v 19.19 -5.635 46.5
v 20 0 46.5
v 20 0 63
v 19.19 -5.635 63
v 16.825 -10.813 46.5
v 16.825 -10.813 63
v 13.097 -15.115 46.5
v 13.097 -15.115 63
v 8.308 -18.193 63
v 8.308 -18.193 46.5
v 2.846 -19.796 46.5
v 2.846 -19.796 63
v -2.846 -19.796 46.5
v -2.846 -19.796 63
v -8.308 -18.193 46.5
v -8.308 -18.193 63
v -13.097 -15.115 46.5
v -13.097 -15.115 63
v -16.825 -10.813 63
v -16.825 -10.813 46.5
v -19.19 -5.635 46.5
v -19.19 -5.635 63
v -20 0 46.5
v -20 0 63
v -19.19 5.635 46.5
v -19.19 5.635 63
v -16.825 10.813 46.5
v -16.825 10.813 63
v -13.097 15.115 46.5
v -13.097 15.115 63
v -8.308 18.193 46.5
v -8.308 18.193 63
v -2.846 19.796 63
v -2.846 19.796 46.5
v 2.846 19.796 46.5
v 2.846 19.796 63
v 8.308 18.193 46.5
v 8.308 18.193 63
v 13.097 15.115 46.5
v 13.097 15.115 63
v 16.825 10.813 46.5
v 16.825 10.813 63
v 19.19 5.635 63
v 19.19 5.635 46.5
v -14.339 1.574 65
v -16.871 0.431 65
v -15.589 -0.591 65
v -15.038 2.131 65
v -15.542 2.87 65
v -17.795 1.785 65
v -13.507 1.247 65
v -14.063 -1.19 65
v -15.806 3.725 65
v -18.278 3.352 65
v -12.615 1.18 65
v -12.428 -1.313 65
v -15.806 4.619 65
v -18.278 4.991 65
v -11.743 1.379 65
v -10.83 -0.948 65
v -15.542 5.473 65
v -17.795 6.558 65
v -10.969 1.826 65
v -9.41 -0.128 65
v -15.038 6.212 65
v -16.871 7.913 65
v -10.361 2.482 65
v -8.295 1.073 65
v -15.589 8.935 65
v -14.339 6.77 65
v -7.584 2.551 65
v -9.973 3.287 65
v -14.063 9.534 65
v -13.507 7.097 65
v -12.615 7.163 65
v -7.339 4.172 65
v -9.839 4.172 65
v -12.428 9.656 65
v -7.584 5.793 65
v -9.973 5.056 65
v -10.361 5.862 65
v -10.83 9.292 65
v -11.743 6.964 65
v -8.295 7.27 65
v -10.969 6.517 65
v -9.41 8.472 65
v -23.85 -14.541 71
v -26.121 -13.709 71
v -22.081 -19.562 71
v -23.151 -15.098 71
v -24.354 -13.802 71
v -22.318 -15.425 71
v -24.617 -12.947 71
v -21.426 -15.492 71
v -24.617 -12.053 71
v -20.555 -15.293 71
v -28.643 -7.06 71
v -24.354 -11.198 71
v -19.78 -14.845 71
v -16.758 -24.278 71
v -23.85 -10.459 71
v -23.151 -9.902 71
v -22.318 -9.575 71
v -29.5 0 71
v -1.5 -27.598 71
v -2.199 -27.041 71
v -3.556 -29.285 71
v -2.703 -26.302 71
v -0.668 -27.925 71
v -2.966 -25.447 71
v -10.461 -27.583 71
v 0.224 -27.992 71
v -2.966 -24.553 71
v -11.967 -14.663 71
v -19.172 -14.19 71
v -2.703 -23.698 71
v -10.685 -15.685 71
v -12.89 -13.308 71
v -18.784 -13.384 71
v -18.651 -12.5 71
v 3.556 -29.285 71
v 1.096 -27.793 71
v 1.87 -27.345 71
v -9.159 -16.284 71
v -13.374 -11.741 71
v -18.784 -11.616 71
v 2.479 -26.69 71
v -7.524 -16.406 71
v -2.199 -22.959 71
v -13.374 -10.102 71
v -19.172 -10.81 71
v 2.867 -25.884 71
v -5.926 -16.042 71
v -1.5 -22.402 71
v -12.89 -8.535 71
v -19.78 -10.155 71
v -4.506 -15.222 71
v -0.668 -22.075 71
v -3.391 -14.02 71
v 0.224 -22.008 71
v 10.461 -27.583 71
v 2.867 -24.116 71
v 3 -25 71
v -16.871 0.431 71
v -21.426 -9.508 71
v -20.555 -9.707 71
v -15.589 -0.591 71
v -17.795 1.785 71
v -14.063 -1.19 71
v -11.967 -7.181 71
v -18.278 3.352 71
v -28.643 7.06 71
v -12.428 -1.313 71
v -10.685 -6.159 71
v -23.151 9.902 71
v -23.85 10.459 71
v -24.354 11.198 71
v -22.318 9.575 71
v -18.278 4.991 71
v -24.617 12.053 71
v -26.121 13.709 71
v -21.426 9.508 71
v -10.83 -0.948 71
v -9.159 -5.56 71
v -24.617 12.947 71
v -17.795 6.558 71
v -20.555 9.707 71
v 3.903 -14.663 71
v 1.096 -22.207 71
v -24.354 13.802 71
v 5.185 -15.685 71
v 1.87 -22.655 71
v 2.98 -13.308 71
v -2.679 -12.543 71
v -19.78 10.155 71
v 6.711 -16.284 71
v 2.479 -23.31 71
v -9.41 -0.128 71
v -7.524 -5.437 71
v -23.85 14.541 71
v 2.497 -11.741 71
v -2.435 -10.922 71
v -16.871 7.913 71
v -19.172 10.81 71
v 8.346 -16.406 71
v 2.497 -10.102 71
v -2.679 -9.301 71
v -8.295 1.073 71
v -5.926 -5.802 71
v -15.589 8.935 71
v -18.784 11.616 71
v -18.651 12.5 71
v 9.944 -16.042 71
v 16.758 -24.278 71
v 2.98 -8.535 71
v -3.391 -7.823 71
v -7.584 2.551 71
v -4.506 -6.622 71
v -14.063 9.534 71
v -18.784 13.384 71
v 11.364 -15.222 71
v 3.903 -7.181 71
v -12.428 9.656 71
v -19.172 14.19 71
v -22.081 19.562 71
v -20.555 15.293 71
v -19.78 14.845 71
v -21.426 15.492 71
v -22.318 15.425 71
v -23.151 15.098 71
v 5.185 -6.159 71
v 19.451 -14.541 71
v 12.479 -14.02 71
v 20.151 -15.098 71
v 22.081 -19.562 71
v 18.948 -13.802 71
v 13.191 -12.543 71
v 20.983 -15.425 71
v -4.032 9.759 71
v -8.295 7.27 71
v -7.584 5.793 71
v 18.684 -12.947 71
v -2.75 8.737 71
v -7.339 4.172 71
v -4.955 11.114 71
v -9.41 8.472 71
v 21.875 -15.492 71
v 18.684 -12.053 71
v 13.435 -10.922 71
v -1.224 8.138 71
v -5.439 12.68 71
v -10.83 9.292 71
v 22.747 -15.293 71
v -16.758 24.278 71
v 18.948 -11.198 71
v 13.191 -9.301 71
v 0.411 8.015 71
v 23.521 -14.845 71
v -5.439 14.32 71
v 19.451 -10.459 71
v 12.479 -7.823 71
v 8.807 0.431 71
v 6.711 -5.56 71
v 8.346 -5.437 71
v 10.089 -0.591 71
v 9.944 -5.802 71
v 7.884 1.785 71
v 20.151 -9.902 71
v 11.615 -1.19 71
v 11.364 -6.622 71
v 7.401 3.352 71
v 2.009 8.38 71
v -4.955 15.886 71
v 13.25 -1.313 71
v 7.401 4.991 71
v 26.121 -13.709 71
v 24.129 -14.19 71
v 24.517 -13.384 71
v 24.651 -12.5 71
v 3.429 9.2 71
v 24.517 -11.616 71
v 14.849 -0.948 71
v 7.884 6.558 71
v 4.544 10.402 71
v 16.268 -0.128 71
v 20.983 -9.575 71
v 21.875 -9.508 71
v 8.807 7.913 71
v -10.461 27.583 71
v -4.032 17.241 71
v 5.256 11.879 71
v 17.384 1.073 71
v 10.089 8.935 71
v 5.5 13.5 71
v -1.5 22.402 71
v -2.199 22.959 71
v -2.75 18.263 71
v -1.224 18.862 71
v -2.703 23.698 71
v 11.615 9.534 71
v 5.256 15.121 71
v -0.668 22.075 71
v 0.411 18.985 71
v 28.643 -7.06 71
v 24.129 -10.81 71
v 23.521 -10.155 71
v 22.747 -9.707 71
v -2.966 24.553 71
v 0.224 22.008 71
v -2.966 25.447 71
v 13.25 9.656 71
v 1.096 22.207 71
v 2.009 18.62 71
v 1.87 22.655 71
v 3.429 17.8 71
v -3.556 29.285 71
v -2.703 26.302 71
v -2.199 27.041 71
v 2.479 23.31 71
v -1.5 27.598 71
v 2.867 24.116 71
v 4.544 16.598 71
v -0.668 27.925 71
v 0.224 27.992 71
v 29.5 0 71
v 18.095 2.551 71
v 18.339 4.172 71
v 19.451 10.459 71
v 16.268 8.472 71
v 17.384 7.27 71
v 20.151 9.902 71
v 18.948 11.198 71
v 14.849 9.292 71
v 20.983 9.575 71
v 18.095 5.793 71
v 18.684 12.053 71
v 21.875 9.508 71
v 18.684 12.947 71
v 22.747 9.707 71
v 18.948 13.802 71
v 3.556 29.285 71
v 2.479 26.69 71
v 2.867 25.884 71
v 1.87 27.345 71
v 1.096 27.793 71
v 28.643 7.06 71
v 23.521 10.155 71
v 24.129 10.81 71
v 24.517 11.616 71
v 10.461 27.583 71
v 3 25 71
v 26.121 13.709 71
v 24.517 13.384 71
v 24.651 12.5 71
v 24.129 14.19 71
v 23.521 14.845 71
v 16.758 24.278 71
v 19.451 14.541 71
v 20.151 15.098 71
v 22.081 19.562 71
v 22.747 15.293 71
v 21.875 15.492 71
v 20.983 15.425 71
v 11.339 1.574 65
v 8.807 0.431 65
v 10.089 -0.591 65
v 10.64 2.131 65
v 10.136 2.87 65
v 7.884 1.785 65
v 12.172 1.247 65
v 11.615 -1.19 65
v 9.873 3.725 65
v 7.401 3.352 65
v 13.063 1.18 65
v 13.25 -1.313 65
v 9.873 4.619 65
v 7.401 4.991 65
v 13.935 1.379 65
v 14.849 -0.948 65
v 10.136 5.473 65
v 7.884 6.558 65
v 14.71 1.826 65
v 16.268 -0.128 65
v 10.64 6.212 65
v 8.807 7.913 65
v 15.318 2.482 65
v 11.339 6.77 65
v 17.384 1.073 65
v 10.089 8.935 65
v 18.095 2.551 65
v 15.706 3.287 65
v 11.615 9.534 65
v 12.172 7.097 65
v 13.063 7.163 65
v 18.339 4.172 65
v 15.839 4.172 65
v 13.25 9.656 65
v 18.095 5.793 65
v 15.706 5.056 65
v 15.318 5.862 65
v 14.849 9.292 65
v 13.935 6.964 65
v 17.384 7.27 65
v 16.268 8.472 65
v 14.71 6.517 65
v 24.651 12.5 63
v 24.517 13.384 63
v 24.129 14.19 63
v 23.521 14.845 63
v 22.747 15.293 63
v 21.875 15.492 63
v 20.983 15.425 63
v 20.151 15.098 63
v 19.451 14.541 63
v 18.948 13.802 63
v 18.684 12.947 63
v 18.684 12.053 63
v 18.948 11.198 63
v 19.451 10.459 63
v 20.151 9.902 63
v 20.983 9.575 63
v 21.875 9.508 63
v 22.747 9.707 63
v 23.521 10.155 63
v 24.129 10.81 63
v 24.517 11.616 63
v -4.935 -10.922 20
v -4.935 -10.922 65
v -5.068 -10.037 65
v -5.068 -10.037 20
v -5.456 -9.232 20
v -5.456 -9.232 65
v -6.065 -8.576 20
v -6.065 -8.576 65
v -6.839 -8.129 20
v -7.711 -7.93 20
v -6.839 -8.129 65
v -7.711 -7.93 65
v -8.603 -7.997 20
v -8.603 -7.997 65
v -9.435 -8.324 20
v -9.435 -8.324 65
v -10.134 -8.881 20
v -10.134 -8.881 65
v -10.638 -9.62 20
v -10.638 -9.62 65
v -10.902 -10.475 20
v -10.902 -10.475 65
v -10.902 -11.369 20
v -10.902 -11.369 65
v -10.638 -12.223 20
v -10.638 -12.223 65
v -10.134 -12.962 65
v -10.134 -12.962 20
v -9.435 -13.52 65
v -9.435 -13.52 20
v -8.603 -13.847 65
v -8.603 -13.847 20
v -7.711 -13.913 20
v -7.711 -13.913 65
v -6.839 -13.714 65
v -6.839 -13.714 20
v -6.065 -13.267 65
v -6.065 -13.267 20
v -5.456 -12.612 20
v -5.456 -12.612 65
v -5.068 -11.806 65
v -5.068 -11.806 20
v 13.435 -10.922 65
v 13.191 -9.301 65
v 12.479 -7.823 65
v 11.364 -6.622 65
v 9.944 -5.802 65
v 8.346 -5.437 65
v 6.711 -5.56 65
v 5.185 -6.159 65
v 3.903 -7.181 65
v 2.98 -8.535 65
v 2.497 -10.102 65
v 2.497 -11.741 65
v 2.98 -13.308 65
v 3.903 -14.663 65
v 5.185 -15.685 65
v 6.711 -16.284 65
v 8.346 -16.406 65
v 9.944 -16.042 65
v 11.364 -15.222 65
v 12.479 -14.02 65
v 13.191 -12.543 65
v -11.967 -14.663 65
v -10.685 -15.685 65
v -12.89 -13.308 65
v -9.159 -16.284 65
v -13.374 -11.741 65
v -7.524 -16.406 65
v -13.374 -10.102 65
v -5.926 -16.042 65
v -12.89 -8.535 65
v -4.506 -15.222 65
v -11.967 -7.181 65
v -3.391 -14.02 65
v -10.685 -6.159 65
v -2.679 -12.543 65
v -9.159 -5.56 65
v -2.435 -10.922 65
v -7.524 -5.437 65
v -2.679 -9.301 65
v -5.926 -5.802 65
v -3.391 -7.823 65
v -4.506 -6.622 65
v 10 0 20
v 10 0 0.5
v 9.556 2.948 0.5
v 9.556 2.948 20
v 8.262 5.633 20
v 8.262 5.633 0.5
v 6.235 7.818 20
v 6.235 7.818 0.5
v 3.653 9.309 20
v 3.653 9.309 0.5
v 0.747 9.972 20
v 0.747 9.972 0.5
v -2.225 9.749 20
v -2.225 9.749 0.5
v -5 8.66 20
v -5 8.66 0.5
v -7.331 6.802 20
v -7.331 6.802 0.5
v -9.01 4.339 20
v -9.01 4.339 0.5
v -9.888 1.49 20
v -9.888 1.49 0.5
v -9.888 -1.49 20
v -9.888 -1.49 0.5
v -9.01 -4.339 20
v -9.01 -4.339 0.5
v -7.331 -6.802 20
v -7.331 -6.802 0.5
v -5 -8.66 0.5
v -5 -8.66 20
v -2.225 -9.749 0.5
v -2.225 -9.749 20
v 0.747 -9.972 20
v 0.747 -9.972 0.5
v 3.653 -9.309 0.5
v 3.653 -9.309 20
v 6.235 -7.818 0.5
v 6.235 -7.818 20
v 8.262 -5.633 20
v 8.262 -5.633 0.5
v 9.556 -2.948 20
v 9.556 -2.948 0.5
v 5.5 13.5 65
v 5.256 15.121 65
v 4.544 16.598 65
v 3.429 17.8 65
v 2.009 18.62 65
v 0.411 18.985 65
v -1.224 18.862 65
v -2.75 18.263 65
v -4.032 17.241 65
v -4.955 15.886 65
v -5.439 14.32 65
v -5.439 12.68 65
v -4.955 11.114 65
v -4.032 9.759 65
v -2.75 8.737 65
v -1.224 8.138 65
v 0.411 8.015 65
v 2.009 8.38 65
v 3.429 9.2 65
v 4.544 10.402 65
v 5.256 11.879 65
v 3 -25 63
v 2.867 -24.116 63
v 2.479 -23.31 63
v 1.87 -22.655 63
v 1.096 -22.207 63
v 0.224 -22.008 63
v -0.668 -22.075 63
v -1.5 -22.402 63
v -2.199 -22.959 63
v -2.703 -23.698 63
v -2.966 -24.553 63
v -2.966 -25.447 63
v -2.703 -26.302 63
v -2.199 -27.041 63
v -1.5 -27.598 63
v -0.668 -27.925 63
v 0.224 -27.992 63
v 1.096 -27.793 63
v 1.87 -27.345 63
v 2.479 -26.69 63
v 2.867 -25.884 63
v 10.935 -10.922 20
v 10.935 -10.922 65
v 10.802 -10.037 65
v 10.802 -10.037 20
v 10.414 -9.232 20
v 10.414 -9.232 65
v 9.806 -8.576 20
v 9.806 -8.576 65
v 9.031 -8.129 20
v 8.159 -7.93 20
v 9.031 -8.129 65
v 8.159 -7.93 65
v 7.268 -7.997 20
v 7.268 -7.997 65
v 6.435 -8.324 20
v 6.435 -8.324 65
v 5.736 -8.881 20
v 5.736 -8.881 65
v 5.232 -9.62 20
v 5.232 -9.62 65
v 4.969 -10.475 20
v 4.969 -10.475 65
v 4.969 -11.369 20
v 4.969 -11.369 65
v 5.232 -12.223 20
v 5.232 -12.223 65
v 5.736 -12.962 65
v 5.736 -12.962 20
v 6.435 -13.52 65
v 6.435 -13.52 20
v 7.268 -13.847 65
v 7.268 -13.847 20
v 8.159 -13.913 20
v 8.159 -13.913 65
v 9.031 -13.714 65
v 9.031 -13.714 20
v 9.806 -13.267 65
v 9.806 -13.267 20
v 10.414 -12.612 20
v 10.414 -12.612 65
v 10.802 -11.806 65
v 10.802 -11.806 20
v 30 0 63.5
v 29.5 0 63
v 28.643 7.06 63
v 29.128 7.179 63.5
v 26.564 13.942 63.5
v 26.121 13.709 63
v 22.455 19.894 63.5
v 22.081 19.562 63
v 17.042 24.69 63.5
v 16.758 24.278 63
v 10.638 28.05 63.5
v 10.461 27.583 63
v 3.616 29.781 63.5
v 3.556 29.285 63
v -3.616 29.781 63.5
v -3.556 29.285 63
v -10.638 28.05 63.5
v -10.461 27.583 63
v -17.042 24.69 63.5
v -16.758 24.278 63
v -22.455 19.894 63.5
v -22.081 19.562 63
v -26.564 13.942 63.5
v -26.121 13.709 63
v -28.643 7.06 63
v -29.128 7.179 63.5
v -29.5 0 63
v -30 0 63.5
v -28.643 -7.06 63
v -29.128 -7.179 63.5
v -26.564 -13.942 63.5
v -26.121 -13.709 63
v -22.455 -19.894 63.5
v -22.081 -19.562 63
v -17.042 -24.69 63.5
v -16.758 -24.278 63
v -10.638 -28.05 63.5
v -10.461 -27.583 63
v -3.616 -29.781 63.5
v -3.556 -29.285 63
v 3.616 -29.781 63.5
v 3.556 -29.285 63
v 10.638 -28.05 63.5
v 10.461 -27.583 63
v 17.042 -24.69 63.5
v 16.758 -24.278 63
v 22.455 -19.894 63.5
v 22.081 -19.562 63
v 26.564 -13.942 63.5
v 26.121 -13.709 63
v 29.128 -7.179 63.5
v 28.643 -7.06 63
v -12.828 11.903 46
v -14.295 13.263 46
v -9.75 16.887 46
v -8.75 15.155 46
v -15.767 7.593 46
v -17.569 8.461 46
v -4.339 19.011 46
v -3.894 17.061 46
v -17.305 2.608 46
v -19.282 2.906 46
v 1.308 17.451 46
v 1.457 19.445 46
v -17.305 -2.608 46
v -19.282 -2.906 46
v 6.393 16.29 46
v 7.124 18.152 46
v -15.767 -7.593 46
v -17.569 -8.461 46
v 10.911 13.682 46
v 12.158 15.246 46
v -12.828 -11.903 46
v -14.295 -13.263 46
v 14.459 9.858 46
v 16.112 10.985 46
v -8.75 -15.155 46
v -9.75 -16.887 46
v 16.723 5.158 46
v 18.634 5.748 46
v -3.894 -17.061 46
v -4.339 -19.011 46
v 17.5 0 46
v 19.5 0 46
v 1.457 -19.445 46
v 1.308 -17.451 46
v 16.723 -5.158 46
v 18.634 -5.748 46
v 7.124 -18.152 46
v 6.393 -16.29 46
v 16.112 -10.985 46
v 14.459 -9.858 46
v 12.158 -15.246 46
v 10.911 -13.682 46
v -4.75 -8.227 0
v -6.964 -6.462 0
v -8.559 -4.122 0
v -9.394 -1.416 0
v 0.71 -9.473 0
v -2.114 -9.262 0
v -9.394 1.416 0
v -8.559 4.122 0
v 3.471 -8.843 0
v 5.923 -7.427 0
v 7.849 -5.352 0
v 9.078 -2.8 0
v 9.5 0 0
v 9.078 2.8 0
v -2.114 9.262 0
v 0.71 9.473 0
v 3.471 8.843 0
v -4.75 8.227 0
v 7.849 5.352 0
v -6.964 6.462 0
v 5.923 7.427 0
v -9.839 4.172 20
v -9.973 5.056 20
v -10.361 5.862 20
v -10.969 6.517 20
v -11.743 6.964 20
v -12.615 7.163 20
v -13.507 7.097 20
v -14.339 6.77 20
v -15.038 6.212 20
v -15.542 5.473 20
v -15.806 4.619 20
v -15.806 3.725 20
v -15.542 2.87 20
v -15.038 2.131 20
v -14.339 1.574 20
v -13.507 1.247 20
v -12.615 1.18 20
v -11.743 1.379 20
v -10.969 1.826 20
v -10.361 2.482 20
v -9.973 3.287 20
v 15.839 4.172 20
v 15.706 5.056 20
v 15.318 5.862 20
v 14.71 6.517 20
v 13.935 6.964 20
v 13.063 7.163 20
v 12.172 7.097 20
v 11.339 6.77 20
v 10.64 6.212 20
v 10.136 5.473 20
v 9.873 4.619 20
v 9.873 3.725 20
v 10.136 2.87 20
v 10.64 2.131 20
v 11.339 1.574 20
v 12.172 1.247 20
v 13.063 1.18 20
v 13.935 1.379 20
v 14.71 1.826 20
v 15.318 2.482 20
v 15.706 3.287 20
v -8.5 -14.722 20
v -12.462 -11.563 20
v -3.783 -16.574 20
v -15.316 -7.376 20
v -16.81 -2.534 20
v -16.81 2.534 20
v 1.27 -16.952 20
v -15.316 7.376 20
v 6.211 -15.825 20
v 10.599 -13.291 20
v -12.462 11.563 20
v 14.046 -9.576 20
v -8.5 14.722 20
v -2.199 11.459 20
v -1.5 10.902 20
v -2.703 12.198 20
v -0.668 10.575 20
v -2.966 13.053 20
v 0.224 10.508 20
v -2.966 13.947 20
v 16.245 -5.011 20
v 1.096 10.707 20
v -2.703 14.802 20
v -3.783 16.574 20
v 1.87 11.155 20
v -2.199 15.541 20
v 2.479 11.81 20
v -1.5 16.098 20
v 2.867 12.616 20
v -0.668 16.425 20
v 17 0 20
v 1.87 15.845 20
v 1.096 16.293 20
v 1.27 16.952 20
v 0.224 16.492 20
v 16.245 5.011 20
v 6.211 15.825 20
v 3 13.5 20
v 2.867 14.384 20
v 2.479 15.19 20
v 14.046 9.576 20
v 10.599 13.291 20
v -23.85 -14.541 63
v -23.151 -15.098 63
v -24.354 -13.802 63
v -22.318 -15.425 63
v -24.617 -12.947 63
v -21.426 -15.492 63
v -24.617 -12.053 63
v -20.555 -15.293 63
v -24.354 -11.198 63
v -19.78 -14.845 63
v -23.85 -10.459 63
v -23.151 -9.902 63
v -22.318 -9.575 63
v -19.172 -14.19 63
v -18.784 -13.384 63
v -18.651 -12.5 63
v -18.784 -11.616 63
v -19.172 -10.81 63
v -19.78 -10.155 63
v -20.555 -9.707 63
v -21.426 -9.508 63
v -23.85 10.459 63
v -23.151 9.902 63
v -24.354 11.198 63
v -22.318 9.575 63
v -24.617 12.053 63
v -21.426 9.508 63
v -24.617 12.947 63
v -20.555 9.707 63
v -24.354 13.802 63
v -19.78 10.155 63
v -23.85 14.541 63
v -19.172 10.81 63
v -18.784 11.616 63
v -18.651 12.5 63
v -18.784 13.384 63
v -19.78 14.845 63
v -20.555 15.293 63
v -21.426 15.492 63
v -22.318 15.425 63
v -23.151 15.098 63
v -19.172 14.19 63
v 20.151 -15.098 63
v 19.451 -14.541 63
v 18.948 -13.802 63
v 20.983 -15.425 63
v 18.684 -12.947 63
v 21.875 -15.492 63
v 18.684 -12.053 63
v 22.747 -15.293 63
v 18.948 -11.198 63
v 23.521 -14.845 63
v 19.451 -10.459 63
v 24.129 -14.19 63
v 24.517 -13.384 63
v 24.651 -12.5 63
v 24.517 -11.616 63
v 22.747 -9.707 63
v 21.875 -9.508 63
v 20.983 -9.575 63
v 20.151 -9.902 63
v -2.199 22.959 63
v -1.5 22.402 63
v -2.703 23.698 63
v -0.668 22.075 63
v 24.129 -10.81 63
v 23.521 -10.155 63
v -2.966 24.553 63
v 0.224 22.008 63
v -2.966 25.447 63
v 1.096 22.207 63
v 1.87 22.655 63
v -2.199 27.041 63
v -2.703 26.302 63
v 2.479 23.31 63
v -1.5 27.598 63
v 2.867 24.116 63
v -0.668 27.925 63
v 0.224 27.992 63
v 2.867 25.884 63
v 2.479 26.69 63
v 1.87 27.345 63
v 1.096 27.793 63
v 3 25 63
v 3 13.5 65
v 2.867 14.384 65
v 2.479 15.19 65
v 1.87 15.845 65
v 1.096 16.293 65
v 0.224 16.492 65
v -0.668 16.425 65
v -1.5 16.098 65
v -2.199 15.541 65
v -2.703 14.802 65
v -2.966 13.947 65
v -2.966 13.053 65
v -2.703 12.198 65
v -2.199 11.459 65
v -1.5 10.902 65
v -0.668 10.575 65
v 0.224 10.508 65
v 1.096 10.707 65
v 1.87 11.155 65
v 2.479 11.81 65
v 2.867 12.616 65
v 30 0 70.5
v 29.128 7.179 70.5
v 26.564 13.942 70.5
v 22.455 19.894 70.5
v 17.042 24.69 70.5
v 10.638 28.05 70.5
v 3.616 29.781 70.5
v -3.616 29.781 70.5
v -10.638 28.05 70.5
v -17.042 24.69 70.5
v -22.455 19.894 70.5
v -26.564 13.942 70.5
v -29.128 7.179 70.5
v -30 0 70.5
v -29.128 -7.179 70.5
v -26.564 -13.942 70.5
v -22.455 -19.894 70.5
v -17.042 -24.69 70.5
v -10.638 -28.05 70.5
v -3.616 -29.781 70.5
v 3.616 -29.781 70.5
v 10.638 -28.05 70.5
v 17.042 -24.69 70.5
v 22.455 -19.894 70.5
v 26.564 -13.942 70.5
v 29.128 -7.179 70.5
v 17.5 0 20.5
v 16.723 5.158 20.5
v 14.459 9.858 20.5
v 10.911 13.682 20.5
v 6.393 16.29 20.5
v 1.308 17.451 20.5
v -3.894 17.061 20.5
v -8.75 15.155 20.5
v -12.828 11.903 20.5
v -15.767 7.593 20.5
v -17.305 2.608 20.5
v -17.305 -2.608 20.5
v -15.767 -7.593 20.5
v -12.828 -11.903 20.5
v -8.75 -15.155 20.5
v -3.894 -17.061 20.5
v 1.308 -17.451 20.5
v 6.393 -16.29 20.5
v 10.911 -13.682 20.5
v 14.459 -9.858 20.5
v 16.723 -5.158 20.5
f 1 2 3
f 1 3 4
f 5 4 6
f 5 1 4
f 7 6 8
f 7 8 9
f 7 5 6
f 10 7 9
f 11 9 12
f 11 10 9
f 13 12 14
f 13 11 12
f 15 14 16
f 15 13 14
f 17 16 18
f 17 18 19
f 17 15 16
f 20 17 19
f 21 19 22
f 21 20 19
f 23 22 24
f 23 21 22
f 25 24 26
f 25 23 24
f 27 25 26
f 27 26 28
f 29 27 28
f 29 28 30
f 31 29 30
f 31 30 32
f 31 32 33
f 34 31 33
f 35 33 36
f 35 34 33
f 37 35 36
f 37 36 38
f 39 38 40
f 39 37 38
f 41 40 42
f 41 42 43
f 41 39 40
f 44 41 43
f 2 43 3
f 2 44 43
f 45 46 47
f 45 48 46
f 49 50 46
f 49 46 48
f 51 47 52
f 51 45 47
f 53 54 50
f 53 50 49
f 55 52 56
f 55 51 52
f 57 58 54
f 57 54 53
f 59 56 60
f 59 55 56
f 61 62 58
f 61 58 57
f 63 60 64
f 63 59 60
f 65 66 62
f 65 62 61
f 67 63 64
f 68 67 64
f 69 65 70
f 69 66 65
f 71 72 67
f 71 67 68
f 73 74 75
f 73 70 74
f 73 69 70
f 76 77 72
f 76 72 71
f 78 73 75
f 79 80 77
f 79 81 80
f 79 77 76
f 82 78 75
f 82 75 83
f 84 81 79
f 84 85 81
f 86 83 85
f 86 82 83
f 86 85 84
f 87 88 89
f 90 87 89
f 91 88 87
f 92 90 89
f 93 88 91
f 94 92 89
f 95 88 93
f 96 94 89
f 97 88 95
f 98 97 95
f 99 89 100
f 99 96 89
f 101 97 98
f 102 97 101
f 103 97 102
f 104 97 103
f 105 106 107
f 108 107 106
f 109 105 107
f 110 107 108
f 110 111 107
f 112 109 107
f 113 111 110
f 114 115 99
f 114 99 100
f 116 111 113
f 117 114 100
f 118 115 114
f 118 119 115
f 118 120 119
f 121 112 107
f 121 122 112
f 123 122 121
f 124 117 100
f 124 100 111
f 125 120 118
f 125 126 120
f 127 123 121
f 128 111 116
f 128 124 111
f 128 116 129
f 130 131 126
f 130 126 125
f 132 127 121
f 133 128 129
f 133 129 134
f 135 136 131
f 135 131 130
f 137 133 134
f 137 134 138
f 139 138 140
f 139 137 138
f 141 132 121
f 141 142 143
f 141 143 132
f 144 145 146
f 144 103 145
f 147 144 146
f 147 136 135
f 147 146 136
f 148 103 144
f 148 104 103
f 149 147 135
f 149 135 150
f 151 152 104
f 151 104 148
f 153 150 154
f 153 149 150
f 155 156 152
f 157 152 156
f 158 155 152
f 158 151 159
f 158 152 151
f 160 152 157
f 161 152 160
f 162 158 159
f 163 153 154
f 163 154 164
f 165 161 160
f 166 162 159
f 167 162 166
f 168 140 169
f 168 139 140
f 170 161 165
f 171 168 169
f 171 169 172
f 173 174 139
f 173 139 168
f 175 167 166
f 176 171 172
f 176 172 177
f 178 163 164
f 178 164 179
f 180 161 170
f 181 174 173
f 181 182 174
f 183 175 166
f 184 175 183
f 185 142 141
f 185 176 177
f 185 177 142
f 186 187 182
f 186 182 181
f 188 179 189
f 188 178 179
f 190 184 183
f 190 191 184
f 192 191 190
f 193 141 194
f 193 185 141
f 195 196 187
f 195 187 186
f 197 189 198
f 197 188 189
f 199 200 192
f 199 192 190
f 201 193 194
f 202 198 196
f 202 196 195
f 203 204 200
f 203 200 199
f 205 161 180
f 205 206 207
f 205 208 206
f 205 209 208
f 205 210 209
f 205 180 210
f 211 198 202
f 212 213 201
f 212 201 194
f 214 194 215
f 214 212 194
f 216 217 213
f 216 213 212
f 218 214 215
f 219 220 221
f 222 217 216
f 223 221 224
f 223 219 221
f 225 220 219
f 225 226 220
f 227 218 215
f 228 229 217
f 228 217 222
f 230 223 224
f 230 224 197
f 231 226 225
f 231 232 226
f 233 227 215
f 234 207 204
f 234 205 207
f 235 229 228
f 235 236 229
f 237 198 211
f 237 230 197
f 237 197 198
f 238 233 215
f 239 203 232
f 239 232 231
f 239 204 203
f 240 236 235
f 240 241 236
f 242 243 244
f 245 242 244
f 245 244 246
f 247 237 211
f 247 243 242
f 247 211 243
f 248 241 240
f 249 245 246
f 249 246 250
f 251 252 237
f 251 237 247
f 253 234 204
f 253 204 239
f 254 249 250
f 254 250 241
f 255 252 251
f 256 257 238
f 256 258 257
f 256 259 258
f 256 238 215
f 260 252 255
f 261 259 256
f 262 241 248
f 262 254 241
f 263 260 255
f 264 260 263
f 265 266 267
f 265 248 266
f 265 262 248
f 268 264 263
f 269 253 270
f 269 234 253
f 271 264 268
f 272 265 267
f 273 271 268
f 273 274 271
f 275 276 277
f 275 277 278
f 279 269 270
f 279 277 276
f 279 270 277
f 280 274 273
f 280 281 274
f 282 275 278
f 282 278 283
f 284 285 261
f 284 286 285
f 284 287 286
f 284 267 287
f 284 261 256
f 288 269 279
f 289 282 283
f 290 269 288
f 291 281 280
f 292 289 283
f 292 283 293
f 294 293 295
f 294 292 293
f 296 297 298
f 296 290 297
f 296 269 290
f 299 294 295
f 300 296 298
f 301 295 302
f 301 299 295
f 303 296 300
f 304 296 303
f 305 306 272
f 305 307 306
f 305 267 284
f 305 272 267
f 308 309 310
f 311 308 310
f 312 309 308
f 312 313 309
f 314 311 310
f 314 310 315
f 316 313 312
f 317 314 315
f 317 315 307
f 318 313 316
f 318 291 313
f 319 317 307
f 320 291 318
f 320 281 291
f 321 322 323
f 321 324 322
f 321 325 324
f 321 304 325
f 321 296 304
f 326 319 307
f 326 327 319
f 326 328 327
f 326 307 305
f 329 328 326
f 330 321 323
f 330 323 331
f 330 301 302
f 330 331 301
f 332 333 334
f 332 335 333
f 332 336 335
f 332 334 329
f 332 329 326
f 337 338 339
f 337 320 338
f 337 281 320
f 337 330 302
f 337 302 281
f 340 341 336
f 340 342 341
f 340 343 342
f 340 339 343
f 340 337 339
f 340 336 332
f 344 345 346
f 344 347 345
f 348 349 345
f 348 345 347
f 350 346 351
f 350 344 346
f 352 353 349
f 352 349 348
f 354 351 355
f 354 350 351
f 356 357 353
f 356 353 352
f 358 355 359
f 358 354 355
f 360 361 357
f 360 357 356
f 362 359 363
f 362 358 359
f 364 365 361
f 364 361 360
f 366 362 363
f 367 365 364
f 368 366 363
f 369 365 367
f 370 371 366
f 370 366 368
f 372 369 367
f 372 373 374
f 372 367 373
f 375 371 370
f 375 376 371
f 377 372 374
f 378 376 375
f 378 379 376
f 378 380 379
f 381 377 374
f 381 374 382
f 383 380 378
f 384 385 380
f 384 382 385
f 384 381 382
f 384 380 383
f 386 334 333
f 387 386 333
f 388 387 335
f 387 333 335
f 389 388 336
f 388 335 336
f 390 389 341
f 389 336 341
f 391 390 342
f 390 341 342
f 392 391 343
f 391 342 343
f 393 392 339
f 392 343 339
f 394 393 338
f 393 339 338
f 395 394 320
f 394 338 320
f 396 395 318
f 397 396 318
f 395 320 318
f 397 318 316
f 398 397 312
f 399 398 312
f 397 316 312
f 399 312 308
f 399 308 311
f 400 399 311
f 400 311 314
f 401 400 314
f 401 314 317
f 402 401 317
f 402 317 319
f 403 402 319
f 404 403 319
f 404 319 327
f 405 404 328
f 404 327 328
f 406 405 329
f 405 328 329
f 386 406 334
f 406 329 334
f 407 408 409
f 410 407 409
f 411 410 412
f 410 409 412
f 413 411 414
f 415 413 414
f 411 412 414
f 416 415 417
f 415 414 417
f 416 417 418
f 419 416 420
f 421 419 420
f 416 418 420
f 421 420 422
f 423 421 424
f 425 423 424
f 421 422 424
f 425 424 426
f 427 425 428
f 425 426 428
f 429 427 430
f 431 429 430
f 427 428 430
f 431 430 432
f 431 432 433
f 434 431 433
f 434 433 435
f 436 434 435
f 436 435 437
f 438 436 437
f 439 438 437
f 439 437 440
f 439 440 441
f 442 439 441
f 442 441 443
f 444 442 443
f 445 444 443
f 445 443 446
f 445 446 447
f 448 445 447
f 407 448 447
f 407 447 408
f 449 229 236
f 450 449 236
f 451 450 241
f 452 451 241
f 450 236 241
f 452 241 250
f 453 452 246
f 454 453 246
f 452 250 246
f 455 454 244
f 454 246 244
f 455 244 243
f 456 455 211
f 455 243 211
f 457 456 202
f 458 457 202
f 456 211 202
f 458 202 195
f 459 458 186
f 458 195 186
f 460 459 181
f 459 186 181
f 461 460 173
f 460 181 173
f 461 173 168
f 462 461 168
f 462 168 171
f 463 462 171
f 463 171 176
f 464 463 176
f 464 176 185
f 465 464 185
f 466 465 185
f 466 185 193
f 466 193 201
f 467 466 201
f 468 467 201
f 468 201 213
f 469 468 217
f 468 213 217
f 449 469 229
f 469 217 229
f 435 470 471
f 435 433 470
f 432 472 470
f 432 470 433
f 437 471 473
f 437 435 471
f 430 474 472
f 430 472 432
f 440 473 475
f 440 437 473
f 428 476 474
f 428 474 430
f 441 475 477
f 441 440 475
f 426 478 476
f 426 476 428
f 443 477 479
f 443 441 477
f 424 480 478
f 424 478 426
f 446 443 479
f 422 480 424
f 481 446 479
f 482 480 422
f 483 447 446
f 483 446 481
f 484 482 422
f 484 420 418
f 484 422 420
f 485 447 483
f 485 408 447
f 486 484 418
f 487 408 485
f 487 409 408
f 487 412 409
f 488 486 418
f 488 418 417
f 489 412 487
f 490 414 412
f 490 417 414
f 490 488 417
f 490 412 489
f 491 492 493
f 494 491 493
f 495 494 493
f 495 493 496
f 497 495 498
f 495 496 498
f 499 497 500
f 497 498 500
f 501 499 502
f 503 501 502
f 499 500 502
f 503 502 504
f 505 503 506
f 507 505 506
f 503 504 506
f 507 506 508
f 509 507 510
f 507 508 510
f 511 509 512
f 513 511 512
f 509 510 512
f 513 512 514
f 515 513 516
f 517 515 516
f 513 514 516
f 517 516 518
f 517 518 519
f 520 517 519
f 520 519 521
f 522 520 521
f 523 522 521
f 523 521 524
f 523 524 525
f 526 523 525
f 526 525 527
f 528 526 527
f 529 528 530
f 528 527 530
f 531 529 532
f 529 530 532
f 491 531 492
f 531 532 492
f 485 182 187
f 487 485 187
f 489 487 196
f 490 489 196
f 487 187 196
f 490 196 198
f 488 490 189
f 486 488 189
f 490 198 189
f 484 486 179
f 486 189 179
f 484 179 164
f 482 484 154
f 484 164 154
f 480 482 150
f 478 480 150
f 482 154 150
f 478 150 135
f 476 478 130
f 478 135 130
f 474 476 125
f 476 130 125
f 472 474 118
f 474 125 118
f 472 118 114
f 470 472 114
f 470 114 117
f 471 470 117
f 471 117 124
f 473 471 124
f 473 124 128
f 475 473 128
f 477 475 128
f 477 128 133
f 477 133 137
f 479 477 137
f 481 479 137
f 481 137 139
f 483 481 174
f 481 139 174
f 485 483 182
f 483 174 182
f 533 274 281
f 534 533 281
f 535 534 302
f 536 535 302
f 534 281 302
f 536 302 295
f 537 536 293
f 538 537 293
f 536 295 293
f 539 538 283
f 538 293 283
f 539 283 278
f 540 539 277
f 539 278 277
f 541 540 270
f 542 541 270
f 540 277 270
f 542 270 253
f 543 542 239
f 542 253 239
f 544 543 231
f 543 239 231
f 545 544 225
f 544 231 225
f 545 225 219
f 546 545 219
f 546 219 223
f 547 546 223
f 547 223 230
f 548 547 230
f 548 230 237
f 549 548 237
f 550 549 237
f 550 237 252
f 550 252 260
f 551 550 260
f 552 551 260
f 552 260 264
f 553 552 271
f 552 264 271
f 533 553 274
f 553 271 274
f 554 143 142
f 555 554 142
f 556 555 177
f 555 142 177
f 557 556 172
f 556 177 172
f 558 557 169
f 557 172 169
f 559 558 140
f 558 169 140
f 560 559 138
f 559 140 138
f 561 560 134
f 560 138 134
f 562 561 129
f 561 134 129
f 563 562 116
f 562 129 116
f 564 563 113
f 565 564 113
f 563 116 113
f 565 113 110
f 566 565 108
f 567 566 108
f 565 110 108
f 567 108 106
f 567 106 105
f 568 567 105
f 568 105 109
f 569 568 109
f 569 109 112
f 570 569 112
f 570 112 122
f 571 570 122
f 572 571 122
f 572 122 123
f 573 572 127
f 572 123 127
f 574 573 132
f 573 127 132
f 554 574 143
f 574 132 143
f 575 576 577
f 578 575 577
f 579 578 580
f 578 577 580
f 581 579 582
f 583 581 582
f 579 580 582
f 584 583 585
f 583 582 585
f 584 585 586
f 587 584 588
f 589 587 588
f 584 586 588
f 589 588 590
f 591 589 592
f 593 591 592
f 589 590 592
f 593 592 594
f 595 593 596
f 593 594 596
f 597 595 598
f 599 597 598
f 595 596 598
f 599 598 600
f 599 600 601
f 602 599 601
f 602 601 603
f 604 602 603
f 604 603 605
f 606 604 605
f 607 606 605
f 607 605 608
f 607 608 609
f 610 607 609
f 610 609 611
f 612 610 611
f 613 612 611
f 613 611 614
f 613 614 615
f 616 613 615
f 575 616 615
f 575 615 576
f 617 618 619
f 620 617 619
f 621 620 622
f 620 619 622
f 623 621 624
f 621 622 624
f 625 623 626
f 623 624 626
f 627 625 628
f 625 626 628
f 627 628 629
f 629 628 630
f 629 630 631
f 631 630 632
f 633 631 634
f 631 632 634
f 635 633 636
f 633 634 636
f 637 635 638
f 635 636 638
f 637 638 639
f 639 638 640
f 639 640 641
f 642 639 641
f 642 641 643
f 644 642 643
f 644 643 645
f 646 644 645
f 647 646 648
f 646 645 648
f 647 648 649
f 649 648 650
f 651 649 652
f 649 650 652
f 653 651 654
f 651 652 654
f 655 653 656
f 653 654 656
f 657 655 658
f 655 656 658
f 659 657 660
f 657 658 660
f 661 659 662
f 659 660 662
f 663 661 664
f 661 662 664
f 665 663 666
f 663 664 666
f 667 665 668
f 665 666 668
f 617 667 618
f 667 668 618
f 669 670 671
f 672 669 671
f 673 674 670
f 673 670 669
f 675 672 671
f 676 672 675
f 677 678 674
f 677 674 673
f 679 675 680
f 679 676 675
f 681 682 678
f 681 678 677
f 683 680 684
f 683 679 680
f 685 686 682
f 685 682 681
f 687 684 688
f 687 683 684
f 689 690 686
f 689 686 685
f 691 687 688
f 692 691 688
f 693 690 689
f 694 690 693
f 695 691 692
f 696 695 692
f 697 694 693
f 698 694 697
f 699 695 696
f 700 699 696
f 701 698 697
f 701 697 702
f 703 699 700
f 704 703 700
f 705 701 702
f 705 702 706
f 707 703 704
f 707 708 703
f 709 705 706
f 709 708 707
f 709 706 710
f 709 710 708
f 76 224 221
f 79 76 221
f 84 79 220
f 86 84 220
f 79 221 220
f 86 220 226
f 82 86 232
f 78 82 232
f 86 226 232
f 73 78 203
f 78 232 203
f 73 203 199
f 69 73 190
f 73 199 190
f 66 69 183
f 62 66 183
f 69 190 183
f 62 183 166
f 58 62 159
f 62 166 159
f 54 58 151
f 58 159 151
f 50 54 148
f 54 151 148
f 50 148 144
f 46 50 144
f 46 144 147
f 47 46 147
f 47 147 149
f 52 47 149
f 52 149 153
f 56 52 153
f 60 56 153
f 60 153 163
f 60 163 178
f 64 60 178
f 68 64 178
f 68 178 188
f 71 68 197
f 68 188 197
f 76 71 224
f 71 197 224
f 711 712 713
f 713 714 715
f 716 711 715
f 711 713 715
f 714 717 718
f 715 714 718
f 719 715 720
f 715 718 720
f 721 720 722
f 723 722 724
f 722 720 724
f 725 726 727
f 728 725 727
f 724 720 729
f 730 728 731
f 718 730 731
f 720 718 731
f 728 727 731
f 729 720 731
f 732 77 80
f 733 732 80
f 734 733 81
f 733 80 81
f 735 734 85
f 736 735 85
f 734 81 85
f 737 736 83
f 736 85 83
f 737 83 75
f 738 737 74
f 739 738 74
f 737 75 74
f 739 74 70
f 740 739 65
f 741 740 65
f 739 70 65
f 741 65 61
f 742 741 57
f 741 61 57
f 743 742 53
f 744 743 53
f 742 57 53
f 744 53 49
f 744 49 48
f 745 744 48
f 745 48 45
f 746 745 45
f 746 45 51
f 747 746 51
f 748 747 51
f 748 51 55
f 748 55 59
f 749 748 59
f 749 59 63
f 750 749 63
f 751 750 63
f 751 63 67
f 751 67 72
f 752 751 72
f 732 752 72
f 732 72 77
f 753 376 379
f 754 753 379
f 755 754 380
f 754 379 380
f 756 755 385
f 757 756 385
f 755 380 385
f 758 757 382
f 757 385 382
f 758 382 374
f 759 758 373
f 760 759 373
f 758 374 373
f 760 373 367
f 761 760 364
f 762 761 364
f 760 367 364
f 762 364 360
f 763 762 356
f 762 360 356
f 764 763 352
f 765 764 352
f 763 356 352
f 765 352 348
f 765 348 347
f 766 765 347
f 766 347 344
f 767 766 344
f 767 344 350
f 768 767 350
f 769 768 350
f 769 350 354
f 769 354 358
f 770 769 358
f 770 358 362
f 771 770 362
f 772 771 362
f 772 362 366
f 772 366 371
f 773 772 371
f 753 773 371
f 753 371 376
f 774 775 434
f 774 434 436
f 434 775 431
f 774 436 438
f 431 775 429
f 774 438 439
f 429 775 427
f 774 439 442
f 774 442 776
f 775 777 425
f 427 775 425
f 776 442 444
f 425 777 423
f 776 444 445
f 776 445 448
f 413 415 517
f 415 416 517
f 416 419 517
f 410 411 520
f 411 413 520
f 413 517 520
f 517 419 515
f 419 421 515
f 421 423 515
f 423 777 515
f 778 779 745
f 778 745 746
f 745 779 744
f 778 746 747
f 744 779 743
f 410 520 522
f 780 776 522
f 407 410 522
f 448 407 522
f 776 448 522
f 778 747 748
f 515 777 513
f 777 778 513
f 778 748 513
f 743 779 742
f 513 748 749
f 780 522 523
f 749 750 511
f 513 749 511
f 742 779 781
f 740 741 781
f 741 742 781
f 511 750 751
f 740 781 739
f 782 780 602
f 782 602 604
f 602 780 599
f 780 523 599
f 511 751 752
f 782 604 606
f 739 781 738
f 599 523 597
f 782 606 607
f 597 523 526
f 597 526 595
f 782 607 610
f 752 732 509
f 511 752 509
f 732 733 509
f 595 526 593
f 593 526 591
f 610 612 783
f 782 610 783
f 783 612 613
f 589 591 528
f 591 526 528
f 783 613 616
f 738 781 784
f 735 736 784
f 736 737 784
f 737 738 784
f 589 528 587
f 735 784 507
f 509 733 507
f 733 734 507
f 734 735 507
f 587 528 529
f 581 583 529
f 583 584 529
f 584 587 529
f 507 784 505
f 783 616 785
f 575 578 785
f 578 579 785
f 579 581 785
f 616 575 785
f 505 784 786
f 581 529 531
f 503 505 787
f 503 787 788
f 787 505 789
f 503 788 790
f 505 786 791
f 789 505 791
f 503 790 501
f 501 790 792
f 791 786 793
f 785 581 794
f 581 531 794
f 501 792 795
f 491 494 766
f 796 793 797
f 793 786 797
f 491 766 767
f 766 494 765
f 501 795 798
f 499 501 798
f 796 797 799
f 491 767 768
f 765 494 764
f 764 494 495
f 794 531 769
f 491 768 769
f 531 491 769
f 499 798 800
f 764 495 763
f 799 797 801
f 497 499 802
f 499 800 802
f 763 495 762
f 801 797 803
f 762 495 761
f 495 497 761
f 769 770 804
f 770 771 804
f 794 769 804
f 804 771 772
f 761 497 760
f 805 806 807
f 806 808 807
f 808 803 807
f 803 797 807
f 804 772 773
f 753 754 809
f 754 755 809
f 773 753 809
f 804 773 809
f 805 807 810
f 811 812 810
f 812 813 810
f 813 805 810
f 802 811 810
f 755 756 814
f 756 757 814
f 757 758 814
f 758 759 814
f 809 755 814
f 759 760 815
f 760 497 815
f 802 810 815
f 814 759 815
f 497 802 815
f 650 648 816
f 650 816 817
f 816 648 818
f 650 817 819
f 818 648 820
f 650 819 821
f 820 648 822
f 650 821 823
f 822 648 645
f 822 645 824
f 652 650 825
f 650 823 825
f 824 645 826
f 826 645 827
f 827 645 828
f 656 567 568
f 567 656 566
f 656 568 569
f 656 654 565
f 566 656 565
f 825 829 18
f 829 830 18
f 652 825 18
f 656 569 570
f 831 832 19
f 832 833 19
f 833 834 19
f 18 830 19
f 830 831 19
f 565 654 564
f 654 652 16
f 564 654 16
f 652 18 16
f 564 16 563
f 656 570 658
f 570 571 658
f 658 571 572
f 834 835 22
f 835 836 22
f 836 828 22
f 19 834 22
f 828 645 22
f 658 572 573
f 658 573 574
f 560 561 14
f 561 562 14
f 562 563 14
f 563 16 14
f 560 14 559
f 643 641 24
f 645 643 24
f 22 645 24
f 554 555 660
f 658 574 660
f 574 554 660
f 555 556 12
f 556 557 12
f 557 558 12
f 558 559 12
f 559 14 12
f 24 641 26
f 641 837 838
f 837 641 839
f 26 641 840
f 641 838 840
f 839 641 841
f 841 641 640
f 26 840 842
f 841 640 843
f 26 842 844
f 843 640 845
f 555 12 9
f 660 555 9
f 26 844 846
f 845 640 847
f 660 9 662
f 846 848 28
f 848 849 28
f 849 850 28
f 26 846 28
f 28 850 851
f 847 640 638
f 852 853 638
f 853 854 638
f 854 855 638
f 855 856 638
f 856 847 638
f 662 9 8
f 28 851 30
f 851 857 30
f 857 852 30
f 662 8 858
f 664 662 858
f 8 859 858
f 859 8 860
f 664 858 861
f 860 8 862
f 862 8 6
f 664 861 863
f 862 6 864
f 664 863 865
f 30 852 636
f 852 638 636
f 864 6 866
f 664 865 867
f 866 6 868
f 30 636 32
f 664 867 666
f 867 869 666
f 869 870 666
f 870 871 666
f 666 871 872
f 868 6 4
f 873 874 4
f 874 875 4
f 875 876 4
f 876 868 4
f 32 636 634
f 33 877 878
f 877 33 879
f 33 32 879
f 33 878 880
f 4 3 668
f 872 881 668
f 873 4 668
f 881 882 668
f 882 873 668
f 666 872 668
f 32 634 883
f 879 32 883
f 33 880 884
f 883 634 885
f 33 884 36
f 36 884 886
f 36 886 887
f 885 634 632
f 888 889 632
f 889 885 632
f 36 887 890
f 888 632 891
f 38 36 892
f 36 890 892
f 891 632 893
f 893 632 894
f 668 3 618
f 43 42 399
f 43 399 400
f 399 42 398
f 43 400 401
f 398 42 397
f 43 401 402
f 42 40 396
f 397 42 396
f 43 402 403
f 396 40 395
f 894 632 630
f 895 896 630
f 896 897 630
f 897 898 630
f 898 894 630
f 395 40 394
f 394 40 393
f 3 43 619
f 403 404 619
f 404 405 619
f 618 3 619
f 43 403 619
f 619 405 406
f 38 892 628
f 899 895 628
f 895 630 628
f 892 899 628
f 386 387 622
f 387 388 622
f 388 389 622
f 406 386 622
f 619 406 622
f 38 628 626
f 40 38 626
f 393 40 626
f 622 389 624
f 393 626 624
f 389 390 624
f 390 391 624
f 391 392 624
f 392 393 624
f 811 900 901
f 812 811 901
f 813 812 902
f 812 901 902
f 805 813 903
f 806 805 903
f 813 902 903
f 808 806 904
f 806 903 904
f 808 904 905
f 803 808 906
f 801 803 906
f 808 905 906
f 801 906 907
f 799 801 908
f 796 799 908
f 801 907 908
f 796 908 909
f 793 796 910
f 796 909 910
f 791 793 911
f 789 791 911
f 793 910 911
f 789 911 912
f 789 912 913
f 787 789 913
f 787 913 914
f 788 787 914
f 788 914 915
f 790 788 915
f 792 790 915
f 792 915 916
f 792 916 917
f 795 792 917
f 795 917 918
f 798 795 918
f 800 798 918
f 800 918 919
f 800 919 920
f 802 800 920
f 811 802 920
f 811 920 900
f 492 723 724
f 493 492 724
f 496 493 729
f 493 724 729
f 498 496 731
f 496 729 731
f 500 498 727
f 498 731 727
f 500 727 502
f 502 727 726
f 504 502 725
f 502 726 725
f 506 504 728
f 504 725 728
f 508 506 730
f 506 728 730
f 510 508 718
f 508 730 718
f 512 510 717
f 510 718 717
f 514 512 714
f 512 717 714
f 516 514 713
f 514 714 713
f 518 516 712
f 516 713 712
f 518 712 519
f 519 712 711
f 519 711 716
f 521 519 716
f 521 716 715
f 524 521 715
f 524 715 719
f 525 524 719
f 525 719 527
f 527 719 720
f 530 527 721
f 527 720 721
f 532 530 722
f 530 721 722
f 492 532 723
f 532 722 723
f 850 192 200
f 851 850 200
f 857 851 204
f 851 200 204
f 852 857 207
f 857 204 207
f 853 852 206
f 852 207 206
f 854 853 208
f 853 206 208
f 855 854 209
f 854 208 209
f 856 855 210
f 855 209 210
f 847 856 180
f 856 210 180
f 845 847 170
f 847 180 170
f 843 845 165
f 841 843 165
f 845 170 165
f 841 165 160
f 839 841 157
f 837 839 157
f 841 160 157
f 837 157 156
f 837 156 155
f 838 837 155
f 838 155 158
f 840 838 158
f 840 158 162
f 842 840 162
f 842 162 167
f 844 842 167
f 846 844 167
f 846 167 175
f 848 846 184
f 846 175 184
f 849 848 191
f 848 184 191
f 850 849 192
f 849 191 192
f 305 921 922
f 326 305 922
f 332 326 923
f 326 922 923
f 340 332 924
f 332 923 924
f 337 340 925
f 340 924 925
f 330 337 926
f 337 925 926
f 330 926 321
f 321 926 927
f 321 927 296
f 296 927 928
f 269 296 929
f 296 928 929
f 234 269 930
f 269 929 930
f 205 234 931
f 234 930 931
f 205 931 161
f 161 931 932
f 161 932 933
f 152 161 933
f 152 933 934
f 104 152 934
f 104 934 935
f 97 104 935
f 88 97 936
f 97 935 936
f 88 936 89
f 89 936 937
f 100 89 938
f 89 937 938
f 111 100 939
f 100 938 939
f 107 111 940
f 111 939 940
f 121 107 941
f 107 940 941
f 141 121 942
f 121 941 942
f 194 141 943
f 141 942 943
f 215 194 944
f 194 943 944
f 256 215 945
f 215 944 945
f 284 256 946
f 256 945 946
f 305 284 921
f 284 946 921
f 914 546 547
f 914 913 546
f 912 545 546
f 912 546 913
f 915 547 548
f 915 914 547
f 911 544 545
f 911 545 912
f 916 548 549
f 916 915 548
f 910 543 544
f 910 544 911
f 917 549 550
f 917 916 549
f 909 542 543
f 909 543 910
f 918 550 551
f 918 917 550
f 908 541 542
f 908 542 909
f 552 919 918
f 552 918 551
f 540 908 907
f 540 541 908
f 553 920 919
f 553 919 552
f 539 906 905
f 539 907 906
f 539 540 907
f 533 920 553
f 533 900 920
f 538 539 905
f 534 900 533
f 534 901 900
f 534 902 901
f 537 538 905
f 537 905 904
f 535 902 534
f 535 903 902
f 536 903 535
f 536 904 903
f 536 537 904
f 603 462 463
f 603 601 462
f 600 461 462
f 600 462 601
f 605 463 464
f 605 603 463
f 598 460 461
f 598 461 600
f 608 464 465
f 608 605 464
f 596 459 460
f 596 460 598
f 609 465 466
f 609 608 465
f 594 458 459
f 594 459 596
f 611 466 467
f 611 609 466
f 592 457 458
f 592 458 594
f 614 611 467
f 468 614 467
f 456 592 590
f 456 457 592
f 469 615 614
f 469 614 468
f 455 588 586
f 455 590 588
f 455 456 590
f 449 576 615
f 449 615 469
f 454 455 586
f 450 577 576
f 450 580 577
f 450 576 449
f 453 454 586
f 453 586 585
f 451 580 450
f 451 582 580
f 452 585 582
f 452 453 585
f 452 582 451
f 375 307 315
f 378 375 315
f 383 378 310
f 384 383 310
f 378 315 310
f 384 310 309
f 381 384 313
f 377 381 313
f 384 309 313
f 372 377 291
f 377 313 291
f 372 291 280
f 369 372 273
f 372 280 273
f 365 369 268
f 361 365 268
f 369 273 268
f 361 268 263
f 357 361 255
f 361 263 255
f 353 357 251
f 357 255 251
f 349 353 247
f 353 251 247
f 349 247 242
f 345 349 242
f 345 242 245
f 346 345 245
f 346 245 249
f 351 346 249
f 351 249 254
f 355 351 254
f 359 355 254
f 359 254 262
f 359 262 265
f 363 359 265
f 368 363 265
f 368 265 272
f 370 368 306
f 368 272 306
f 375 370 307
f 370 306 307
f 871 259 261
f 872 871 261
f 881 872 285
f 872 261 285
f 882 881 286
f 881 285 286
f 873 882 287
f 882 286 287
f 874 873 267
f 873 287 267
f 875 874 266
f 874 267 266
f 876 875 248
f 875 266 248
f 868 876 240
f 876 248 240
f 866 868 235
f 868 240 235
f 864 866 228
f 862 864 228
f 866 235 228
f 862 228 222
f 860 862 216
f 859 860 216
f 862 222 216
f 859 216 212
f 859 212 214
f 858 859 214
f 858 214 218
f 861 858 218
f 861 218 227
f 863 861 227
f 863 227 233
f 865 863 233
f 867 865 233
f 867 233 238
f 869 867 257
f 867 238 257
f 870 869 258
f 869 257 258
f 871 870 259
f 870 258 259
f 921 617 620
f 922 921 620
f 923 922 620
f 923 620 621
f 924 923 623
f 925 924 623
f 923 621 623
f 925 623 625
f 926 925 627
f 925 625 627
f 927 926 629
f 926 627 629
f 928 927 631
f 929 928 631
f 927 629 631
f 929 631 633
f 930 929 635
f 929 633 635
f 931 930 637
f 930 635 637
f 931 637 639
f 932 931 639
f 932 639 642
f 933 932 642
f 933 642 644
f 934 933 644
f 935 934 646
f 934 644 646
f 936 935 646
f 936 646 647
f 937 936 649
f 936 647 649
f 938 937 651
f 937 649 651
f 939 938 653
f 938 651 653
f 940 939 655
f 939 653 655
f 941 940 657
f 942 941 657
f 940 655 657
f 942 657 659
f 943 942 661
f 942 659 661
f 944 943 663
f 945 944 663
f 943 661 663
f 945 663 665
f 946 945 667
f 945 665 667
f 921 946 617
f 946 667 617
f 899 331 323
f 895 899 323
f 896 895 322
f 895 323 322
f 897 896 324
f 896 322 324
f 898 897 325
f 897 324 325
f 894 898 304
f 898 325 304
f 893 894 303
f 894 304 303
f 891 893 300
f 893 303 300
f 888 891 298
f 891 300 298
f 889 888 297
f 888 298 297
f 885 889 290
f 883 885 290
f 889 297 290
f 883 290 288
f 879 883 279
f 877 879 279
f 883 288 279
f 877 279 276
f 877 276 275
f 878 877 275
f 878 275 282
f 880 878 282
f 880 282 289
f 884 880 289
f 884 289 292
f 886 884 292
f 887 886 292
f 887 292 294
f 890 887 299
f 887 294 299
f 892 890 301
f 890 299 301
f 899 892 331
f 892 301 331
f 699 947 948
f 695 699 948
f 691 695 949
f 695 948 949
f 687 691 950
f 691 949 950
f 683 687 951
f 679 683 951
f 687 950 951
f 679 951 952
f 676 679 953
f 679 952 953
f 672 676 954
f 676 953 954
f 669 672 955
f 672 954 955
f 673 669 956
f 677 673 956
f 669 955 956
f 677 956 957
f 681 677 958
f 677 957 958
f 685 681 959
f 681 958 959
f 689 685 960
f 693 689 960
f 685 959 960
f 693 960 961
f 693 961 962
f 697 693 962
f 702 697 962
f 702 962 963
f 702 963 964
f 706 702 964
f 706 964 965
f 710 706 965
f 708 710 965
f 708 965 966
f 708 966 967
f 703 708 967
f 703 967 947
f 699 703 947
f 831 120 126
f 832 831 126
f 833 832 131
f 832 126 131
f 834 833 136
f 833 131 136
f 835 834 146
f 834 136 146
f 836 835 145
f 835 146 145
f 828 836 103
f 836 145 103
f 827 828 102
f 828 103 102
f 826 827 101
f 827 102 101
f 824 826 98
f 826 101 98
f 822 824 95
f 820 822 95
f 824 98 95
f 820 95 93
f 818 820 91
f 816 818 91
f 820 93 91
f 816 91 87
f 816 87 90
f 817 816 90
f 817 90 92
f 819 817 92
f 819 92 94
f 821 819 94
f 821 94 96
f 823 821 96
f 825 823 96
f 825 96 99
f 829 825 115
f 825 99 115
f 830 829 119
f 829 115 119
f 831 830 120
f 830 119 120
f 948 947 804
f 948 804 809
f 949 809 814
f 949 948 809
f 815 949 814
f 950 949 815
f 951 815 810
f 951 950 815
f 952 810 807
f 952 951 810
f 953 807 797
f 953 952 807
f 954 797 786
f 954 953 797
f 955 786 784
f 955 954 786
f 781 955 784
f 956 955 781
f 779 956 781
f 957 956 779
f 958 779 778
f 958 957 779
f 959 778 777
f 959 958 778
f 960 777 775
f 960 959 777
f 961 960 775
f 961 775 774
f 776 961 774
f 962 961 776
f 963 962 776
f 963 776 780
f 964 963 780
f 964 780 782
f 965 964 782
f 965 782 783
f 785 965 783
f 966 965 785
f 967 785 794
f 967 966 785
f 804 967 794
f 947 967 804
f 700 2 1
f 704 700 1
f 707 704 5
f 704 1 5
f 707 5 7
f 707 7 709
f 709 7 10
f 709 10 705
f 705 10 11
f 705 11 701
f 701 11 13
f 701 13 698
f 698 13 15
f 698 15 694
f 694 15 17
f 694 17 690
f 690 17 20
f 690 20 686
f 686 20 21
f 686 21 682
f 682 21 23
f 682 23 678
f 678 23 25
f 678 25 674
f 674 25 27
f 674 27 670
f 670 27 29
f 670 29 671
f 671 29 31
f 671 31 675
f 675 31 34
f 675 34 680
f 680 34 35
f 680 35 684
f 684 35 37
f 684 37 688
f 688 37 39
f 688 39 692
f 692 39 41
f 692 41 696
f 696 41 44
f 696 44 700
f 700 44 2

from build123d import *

# Parameters (mm, degrees)
SKETCH_1_R          = 10
EXTRUDE_1_DEPTH     = 20
SKETCH_2_R          = 17.5
EXTRUDE_2_DEPTH     = 41
SKETCH_3_R          = 17.5
EXTRUDE_3_DEPTH     = 10
SKETCH_8_R          = 3
CUT_EXTRUDE_4_DEPTH = 60
EXTRUDE_START       = -8
SKETCH_9_R          = 30
SKETCH_9_R_2        = 17.5
EXTRUDE_4_DEPTH     = 8
EXTRUDE_START_2     = 17
SKETCH_10_R         = 20
SKETCH_10_R_2       = 17.5
EXTRUDE_5_DEPTH     = 17
CHAMFER_1_SIZE      = 0.5
CHAMFER_2_SIZE      = 0.5
SKETCH_12_R         = 5.5
CUT_EXTRUDE_6_DEPTH = 6
SKETCH_13_R         = 3
CUT_EXTRUDE_7_DEPTH = 8


with BuildPart() as part:
    # 草图1 → 拉伸1 (new body)
    with BuildSketch(Plane.XY):
        Circle(SKETCH_1_R)
    extrude(amount=EXTRUDE_1_DEPTH)

    # 草图2 → 拉伸2 (add)
    with BuildSketch(Plane.XY.offset(20)):
        Circle(SKETCH_2_R)
    extrude(amount=EXTRUDE_2_DEPTH)

    # 草图3 → 拉伸3 (add)
    with BuildSketch(Plane.XY.offset(61)):
        Circle(SKETCH_3_R)
    extrude(amount=EXTRUDE_3_DEPTH)

    # 草图8 → 切除-拉伸4 (cut)
    with BuildSketch(Plane.XY.offset(71)):
        with Locations((12.83926297, 4.171729424)):
            Circle(SKETCH_8_R)
        with Locations((0, 13.5)):
            Circle(SKETCH_8_R)
        with Locations((7.935100906, -10.921729424)):
            Circle(SKETCH_8_R)
        with Locations((-7.935100906, -10.921729424)):
            Circle(SKETCH_8_R)
        with Locations((-12.83926297, 4.171729424)):
            Circle(SKETCH_8_R)
    extrude(amount=-CUT_EXTRUDE_4_DEPTH, mode=Mode.SUBTRACT)

    # 草图9 → 拉伸4 (add)
    with BuildSketch(Plane.XY.offset(71).offset(EXTRUDE_START)):
        Circle(SKETCH_9_R)
        Circle(SKETCH_9_R_2, mode=Mode.SUBTRACT)
    extrude(amount=EXTRUDE_4_DEPTH)

    # 草图10 → 拉伸5 (add)
    with BuildSketch(Plane(origin=(0, 0, 63), x_dir=(-1, 0, 0), z_dir=(0, 0, -1)).offset(EXTRUDE_START_2)):
        with Locations(Location((0, 0, 0), (0, 0, 180))):
            Circle(SKETCH_10_R)
        Circle(SKETCH_10_R_2, mode=Mode.SUBTRACT)
    extrude(amount=-EXTRUDE_5_DEPTH)

    # 倒角1
    chamfer_1_edges = [part.edges().sort_by_distance(p)[0] for p in [
        (-17.5, 0, 20),
    ]]
    chamfer(chamfer_1_edges, length=CHAMFER_1_SIZE)

    # 倒角2
    chamfer_2_edges = [part.edges().sort_by_distance(p)[0] for p in [
        (-10, 0, 0),
        (-30, 0, 63),
        (-30, 0, 71),
        (-20, 0, 46),
    ]]
    chamfer(chamfer_2_edges, length=CHAMFER_2_SIZE)

    # 草图12 → 切除-拉伸6 (cut)
    with BuildSketch(Plane.XY.offset(71)):
        with Locations((0, 13.5)):
            Circle(SKETCH_12_R)
        with Locations((12.83926297, 4.171729424)):
            Circle(SKETCH_12_R)
        with Locations((7.935100906, -10.921729424)):
            Circle(SKETCH_12_R)
        with Locations((-7.935100906, -10.921729424)):
            Circle(SKETCH_12_R)
        with Locations((-12.83926297, 4.171729424)):
            Circle(SKETCH_12_R)
    extrude(amount=-CUT_EXTRUDE_6_DEPTH, mode=Mode.SUBTRACT)

    # 草图13 → 切除-拉伸7 (cut)
    with BuildSketch(Plane.XY.offset(71)):
        with Locations((0, 25)):
            Circle(SKETCH_13_R)
        with Locations((21.650635095, 12.5)):
            Circle(SKETCH_13_R)
        with Locations((21.650635095, -12.5)):
            Circle(SKETCH_13_R)
        with Locations((0, -25)):
            Circle(SKETCH_13_R)
        with Locations((-21.650635095, -12.5)):
            Circle(SKETCH_13_R)
        with Locations((-21.650635095, 12.5)):
            Circle(SKETCH_13_R)
    extrude(amount=-CUT_EXTRUDE_7_DEPTH, mode=Mode.SUBTRACT)


solid = part.part
